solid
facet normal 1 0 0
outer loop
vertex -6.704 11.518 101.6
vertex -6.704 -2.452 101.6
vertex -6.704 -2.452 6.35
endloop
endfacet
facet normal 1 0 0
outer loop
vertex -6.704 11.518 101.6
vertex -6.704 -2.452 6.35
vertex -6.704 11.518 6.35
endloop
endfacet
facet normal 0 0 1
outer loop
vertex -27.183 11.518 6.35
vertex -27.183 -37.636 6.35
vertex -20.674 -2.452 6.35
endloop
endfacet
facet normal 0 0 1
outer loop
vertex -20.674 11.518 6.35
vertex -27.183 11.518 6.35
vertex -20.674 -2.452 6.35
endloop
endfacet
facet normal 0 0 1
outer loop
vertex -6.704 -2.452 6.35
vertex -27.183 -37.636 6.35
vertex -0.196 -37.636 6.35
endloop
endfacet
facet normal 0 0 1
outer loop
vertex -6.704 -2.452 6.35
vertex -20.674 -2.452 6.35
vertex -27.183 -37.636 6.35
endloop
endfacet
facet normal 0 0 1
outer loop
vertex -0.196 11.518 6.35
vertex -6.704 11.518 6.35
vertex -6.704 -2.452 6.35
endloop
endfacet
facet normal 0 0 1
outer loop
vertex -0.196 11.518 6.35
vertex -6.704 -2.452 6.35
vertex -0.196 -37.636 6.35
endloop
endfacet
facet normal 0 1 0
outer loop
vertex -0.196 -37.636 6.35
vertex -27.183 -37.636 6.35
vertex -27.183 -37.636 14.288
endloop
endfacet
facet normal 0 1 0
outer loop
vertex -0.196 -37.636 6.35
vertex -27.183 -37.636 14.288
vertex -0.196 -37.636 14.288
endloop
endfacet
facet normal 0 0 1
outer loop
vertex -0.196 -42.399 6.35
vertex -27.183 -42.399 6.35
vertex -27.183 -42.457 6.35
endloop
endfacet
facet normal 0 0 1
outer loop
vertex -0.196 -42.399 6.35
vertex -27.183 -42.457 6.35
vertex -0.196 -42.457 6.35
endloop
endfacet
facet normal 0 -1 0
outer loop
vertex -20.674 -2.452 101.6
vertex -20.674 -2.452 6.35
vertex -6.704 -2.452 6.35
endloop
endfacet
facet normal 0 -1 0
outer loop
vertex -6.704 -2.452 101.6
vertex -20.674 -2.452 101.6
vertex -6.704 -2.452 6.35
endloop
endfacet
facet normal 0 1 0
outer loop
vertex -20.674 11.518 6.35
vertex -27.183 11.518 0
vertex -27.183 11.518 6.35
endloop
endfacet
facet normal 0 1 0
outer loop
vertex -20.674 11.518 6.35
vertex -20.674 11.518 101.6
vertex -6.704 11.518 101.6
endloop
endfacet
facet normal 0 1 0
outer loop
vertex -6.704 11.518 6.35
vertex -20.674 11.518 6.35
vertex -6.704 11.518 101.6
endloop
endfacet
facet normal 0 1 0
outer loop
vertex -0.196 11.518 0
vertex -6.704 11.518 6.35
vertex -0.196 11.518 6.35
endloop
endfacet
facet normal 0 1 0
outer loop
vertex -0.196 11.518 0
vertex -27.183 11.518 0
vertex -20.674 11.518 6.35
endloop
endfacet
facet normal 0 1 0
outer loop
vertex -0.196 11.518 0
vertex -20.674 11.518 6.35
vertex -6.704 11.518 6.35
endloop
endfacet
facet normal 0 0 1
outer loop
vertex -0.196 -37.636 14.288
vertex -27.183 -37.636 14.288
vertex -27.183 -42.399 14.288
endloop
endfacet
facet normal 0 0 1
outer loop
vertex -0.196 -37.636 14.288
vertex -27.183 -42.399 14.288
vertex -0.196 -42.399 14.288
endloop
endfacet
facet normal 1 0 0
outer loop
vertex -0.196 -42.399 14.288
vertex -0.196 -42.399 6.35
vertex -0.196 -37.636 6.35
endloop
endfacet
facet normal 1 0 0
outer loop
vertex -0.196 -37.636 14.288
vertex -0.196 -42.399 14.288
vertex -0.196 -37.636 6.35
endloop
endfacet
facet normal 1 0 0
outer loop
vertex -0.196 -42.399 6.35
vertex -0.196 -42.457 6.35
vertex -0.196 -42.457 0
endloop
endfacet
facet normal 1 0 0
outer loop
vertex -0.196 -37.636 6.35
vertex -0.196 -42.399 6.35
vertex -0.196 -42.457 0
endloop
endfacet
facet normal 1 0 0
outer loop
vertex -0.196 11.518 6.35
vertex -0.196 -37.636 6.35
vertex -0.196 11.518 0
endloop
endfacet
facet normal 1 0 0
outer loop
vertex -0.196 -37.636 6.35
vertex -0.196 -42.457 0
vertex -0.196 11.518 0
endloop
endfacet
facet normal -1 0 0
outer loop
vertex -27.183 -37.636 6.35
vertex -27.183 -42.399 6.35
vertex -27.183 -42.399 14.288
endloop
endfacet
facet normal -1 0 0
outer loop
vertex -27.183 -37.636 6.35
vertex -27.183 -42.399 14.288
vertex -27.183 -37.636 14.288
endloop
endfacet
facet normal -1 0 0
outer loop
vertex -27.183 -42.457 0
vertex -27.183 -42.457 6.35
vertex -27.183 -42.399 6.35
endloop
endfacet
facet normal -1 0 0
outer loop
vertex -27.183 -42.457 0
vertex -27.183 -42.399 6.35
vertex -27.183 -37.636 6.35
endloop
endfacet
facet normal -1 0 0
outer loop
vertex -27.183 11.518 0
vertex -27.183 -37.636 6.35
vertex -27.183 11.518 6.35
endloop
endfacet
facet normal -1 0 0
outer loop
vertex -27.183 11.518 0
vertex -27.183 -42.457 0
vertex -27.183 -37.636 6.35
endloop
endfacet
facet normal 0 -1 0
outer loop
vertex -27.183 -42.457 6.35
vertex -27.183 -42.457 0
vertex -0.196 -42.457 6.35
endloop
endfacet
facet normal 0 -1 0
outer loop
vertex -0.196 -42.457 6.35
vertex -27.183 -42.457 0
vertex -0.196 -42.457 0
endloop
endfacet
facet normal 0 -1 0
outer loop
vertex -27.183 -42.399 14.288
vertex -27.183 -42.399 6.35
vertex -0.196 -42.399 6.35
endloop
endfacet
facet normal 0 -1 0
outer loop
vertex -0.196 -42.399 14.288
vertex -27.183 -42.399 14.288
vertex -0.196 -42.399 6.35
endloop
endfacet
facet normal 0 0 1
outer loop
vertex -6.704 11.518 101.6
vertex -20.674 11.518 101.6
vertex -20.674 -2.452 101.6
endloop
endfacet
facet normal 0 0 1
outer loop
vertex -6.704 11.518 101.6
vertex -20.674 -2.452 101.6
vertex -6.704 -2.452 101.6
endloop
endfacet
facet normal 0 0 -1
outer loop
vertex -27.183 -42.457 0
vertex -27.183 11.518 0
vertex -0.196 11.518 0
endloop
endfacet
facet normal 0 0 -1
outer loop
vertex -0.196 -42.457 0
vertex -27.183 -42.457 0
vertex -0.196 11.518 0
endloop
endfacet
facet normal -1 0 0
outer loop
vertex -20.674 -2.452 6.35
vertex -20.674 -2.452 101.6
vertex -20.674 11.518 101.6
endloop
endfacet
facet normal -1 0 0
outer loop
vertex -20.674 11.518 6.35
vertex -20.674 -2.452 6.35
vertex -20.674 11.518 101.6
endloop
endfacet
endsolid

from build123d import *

# Parameters (mm, degrees)
F0_W     = 26.9875
F0_H     = 53.975
F1_DEPTH = 6.35
F2_W     = 26.9875
F2_H     = 4.7625
F3_DEPTH = 7.9375
F4_W     = 6.985
F4_H     = 13.97
F5_DEPTH = 101.6


with BuildPart() as f1:
    # F0 (on Top) → F1 (new body)
    with BuildSketch(Plane.XY):
        with Locations((-13.6893766582, -15.4694584429)):
            Rectangle(F0_W, F0_H)
    extrude(amount=F1_DEPTH)

    # F2 (on face) → F3 (join)
    with BuildSketch(Plane.XY.offset(6.35)):
        with Locations((-13.6893766582, -40.0176870465)):
            Rectangle(F2_W, F2_H)
    extrude(amount=F3_DEPTH)

    # F4 (on Top) → F5 (join)
    with BuildSketch(Plane.XY):
        with Locations((-17.1818766582, 4.5330415571)):
            Rectangle(F4_W, F4_H)
        with Locations((-10.1968766582, 4.5330415571)):
            Rectangle(F4_W, F4_H)
    extrude(amount=F5_DEPTH)


solid = f1.part
